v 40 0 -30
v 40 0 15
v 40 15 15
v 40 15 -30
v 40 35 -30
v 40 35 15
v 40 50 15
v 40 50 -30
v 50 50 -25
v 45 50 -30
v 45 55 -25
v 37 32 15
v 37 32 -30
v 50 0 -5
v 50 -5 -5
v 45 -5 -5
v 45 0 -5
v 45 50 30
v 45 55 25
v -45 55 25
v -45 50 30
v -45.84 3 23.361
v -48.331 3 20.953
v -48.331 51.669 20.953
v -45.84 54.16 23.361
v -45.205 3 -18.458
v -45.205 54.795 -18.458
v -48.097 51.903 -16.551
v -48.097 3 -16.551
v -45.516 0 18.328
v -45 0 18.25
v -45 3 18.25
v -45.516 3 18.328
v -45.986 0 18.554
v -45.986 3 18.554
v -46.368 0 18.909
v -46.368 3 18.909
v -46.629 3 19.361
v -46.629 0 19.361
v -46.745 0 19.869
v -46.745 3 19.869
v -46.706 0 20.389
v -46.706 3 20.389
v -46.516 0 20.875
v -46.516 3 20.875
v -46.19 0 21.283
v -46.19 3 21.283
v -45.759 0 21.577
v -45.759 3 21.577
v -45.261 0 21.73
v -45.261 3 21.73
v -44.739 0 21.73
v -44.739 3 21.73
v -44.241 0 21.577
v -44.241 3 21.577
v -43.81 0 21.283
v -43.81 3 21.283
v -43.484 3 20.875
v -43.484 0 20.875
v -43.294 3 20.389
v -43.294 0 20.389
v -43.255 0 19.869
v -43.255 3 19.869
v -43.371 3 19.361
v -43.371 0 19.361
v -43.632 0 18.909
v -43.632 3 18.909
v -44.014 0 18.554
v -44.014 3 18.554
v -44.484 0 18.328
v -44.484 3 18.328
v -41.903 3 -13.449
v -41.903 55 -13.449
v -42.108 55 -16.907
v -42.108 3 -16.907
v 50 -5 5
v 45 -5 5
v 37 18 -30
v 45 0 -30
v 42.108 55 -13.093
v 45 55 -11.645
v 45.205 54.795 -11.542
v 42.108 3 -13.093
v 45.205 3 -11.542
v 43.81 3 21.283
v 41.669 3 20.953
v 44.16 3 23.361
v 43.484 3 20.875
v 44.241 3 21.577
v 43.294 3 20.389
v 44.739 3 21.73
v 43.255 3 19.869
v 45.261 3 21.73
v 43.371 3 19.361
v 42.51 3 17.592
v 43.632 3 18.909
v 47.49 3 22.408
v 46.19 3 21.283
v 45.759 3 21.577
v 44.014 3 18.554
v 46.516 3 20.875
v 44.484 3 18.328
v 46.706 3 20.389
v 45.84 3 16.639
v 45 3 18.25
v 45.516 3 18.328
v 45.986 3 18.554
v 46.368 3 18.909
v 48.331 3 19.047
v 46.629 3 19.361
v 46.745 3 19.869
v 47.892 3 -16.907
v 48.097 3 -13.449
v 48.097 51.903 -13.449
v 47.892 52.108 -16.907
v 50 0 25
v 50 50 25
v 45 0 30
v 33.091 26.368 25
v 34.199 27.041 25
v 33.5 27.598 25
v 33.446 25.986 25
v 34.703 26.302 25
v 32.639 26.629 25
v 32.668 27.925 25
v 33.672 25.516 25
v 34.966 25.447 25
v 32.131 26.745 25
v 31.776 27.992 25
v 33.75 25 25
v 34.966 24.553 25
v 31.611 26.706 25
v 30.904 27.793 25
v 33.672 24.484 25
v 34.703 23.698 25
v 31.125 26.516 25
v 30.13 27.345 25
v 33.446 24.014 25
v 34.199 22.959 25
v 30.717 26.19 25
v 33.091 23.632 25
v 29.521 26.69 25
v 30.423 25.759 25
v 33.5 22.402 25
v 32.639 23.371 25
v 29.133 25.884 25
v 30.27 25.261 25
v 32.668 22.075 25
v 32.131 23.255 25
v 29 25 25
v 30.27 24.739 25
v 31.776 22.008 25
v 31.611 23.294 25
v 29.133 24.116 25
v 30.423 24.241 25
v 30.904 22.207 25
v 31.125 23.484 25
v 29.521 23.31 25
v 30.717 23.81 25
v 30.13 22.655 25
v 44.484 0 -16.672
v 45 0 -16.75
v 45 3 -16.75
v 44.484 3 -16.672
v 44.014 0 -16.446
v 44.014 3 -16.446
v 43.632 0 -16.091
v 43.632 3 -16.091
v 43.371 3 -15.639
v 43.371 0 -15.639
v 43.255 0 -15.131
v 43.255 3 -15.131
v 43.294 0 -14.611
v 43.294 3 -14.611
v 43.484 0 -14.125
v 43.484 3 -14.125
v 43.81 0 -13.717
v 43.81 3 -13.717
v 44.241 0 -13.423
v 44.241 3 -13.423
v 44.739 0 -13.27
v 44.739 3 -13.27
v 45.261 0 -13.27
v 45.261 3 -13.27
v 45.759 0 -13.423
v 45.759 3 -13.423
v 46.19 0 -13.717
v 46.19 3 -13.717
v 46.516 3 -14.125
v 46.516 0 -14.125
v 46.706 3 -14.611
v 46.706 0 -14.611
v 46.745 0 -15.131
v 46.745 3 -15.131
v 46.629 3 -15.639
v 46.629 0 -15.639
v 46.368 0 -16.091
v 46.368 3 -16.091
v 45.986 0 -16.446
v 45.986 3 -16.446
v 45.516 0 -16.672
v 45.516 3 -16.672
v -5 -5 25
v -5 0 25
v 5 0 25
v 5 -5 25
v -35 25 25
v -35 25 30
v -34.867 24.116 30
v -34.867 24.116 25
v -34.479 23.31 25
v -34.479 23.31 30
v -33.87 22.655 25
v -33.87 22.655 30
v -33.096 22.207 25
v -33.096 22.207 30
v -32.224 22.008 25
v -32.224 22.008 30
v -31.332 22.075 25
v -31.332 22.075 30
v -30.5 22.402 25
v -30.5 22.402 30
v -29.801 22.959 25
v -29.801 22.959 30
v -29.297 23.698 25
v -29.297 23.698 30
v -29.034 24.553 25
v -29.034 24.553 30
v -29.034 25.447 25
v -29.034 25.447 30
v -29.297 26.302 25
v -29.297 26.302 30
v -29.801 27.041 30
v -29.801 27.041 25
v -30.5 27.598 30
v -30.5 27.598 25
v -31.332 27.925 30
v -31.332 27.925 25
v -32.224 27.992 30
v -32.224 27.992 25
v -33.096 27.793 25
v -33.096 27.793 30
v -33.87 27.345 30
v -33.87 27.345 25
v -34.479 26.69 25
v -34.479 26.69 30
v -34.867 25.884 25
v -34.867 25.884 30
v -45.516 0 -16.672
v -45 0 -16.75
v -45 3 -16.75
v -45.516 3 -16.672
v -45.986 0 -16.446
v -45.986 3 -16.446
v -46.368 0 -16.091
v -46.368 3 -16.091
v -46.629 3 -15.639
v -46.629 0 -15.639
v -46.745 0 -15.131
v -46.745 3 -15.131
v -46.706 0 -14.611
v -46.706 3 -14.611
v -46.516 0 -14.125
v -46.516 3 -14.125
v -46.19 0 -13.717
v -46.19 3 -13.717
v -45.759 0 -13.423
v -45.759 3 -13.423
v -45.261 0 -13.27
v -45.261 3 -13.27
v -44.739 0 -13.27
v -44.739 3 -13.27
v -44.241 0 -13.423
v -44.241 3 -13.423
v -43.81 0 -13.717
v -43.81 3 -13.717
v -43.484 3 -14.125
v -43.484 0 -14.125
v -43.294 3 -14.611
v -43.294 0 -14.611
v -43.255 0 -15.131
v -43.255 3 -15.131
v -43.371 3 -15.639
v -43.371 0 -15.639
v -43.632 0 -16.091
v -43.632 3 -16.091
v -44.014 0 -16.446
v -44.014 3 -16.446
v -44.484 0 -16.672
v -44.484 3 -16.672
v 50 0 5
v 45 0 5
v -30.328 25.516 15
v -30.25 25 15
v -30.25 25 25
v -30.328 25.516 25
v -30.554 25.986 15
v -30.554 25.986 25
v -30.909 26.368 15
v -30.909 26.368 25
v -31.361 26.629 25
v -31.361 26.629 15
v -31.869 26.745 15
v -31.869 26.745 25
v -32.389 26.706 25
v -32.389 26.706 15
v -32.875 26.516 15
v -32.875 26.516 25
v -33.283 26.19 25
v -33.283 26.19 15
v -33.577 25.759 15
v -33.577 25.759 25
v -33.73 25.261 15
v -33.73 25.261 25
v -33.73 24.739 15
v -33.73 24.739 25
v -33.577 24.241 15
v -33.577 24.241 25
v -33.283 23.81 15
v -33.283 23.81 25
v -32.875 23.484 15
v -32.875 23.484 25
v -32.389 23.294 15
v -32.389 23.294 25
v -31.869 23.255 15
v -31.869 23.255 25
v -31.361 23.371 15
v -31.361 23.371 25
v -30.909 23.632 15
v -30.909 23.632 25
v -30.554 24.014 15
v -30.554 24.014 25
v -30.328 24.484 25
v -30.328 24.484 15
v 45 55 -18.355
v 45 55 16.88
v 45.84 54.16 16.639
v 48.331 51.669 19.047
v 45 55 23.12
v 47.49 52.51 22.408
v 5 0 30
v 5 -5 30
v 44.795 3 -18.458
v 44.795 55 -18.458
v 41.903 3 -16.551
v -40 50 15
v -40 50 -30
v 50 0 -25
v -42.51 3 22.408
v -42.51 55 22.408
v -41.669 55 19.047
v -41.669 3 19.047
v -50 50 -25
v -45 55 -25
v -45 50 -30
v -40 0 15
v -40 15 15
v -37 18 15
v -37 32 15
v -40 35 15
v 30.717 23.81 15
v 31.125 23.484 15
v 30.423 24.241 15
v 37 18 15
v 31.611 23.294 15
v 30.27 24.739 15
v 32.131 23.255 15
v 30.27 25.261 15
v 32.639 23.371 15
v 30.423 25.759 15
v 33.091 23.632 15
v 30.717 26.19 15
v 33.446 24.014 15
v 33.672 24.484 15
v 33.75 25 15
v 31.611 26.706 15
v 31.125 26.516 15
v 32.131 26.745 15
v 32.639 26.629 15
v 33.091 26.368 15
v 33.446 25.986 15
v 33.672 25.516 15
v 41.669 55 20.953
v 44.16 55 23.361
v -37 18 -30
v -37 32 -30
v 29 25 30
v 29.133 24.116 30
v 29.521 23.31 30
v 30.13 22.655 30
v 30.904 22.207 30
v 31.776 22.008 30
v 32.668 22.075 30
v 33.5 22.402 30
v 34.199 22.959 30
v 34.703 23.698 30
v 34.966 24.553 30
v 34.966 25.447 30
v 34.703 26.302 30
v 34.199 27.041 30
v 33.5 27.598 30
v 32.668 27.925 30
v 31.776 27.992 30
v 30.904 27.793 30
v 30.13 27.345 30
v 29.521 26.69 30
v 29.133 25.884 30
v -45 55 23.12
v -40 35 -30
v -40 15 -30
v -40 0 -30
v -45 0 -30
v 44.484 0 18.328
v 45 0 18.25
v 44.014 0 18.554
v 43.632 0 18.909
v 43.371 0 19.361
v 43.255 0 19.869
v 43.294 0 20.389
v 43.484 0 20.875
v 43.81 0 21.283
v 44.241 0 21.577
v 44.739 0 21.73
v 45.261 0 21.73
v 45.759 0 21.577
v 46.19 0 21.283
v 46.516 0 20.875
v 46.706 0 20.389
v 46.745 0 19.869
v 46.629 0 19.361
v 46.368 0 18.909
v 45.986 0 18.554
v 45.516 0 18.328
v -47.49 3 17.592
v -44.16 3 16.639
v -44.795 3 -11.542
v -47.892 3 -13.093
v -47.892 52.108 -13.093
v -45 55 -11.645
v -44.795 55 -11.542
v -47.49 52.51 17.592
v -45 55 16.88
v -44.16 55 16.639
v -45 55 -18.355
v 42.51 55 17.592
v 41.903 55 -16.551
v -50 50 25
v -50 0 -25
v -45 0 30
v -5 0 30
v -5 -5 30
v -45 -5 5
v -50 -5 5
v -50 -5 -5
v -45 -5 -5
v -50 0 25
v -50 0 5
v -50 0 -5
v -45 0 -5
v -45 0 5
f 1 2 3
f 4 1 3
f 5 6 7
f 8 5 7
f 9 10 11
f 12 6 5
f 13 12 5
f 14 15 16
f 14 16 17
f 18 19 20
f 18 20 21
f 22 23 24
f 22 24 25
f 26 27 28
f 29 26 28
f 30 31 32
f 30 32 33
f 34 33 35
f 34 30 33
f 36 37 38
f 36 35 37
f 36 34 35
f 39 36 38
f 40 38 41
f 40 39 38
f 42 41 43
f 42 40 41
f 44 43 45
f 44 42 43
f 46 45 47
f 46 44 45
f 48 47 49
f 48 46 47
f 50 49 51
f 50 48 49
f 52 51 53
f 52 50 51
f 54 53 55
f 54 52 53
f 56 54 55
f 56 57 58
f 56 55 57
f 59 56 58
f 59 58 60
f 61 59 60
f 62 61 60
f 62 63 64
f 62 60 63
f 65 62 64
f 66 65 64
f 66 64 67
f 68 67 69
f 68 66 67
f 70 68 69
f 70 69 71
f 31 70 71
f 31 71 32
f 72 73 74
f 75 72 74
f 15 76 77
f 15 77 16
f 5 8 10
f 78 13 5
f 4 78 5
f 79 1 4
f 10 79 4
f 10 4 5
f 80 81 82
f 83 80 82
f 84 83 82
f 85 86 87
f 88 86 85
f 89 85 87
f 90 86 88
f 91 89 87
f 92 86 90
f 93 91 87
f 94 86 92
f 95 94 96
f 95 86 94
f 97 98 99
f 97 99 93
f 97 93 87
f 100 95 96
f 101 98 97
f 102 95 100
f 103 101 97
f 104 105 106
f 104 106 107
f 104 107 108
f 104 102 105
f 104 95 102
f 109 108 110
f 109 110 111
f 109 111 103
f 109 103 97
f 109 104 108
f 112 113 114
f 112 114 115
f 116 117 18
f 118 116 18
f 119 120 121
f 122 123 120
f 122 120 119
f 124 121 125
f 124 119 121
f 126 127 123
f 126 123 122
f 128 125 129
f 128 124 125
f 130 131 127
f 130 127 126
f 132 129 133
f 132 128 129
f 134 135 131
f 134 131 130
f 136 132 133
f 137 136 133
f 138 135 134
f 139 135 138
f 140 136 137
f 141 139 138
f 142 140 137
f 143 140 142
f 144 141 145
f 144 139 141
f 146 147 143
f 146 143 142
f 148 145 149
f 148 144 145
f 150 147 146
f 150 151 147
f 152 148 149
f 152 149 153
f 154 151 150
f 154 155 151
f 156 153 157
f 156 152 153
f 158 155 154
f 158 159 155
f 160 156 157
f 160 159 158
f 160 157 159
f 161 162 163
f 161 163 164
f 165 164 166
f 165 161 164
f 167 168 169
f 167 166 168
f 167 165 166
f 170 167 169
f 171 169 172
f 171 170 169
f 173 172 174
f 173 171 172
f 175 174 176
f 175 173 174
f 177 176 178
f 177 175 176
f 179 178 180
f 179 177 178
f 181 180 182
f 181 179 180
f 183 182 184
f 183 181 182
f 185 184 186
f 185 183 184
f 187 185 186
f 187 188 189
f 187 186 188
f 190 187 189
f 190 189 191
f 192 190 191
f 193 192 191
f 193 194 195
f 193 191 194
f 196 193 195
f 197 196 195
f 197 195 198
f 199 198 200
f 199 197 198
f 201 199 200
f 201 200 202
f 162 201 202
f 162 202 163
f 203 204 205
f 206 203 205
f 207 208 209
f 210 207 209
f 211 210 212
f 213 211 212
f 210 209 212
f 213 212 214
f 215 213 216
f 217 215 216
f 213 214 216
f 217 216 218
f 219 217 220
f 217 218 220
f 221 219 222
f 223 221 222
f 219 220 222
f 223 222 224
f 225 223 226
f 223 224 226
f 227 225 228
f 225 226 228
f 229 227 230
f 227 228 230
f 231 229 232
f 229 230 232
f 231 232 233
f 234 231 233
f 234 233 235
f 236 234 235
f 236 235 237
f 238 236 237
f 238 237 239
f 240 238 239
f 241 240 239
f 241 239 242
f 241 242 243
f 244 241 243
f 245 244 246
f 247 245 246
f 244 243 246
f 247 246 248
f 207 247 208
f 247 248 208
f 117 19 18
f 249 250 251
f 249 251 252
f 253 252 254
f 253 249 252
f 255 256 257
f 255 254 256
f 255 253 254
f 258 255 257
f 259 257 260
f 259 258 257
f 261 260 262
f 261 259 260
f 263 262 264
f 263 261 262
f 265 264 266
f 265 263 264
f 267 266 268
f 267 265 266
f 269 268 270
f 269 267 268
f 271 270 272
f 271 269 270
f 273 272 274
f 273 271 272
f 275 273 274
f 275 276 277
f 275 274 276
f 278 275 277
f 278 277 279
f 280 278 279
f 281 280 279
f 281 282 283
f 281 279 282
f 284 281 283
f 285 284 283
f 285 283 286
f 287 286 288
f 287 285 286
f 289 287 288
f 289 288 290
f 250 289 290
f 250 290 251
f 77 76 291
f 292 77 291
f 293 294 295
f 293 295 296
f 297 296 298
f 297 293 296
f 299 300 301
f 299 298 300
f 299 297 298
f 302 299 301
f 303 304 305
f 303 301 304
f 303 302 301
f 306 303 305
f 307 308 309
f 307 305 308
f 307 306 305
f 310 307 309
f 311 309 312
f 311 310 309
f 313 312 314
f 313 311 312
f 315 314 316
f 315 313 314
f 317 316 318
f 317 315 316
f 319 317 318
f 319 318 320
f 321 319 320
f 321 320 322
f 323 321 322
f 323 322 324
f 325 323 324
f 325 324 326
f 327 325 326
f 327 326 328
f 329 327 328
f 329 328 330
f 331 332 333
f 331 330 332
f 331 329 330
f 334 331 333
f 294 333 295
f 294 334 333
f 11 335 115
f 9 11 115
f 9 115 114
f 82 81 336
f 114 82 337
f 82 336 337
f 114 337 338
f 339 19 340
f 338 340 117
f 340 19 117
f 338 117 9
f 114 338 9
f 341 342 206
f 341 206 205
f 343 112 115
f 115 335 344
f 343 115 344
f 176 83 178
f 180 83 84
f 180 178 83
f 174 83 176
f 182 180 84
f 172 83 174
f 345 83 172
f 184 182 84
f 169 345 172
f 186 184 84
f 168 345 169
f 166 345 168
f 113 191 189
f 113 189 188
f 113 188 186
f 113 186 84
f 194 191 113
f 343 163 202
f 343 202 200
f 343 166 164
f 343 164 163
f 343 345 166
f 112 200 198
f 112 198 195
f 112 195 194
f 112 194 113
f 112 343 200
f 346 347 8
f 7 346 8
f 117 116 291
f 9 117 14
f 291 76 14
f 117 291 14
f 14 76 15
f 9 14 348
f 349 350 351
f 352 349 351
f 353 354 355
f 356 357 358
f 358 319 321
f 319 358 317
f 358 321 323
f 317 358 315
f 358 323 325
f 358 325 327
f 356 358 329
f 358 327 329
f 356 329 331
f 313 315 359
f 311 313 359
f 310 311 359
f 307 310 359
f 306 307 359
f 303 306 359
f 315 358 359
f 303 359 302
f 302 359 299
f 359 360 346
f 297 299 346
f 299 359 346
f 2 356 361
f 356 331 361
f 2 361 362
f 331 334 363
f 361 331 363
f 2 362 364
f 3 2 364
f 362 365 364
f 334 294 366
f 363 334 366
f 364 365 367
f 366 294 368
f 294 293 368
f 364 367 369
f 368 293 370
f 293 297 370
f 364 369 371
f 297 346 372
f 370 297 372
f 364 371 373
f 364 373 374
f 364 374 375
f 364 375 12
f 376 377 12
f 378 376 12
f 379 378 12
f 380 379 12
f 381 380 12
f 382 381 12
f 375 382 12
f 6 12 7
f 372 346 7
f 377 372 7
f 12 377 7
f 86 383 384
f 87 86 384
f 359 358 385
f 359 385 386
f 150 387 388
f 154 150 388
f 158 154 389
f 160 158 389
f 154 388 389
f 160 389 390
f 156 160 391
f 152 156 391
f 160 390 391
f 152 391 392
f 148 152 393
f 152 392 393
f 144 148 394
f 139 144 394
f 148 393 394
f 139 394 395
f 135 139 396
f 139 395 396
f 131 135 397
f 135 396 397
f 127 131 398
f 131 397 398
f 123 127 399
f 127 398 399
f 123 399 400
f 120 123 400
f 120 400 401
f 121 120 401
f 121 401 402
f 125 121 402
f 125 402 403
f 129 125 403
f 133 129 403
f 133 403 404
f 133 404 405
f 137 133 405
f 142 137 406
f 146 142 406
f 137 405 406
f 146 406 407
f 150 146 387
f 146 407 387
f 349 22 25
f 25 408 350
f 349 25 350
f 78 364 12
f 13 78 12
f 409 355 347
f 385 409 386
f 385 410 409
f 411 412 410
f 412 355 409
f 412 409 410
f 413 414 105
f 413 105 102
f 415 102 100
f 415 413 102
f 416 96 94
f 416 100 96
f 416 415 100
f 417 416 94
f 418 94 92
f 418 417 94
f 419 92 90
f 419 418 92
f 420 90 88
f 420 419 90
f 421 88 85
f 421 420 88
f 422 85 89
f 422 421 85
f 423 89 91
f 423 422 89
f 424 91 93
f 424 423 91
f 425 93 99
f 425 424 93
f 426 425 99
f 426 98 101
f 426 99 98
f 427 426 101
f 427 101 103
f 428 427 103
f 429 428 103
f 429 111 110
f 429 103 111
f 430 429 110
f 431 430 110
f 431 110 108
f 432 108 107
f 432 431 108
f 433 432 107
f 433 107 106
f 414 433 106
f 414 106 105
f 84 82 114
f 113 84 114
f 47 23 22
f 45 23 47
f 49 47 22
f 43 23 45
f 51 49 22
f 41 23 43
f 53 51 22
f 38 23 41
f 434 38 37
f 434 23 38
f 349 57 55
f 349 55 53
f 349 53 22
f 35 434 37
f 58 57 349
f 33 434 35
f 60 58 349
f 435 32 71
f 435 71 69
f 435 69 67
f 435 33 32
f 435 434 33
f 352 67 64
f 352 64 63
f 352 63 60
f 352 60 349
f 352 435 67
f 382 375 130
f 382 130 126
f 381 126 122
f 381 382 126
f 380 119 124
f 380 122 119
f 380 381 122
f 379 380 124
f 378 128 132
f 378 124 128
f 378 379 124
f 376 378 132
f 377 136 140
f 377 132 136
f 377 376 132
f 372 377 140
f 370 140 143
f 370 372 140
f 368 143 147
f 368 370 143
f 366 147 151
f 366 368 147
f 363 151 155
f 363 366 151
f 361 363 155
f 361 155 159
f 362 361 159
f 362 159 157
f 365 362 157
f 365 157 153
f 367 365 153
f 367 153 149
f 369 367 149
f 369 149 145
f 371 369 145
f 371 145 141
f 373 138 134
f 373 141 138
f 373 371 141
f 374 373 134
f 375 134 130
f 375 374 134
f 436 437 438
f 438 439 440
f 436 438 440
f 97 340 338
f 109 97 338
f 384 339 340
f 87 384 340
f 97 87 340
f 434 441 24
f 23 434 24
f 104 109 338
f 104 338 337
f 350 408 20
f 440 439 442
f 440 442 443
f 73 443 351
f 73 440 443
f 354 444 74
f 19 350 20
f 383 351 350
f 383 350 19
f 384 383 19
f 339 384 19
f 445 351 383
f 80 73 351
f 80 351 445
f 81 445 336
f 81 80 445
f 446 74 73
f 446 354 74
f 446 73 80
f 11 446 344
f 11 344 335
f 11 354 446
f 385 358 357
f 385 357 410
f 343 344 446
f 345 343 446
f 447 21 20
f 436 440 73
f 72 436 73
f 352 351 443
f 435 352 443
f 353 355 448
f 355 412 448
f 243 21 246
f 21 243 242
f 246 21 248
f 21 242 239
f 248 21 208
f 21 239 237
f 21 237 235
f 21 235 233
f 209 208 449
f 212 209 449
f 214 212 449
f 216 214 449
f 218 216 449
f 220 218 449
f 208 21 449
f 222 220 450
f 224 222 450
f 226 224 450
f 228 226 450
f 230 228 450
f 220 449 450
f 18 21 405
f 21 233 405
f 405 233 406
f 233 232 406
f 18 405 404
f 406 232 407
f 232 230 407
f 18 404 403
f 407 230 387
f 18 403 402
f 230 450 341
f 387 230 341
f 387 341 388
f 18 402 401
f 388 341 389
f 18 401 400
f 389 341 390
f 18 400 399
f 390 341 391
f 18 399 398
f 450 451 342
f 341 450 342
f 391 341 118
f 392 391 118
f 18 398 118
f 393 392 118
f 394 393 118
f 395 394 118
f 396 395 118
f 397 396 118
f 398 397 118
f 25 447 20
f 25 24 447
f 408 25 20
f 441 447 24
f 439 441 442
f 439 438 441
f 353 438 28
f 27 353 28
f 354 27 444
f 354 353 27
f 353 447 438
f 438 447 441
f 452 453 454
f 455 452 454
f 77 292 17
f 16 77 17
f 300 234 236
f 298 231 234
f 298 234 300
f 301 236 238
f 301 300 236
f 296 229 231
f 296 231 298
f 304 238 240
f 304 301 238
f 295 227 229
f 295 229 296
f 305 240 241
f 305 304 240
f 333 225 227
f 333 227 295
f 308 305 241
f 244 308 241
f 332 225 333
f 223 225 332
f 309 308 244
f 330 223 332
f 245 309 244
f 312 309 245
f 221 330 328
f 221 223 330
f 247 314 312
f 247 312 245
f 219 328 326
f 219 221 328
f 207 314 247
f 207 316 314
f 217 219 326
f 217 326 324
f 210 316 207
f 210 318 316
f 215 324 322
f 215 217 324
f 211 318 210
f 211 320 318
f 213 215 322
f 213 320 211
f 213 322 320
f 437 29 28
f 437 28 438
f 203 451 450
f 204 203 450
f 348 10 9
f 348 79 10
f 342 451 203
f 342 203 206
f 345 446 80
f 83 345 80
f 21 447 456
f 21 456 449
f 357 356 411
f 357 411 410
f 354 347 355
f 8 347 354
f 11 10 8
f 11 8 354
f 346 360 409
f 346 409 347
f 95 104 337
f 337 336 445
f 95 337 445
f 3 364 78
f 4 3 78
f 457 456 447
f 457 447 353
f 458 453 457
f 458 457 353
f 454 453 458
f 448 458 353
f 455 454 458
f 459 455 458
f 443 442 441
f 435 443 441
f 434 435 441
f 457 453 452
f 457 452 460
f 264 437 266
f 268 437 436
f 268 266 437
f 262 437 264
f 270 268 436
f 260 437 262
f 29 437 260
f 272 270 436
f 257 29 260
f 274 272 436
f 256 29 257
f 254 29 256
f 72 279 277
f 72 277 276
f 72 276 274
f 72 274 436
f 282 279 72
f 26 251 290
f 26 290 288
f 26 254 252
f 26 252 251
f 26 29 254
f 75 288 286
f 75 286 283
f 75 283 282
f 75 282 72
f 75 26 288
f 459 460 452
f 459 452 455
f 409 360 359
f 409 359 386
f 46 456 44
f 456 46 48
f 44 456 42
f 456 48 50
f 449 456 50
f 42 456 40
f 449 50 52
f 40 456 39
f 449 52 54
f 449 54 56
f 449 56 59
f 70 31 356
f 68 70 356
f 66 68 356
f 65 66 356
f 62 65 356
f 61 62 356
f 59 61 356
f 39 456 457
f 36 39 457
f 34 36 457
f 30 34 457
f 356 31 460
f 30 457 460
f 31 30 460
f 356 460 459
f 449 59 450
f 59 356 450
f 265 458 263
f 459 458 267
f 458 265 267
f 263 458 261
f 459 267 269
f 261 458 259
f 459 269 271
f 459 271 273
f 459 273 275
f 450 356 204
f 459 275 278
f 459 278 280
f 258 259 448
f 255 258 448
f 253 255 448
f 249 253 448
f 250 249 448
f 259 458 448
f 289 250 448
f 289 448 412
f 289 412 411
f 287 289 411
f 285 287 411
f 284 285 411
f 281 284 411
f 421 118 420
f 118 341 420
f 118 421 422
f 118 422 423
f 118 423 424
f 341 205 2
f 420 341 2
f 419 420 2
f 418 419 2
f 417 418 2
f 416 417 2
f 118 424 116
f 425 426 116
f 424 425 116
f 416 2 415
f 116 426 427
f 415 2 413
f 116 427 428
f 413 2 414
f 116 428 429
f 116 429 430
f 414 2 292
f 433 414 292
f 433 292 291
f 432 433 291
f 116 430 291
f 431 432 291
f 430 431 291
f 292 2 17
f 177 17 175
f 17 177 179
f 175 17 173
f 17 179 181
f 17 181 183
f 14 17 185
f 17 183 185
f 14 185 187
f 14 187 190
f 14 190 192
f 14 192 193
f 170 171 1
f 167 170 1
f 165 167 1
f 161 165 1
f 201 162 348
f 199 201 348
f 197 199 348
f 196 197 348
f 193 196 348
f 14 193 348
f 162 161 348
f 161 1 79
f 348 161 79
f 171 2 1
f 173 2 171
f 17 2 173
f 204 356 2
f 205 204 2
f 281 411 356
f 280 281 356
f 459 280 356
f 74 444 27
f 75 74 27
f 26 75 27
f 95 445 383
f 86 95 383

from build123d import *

# Parameters (mm, degrees)
SKETCH1_W               = 100
SKETCH1_H               = 60
BOSS_EXTRUDE1_DEPTH     = 55
CUT_EXTRUDE1_START      = -30
SKETCH2_W               = 80
SKETCH2_H               = 100
CUT_EXTRUDE1_DEPTH      = 45
CUT_EXTRUDE2_DEPTH      = 81.156097709
CUT_EXTRUDE2_DEPTH_BACK = 81.156097709
SKETCH3_R               = 1.75
CUT_EXTRUDE3_START      = 55
CUT_EXTRUDE3_DEPTH      = 52
BOSS_EXTRUDE2_START     = 15
SKETCH5_W               = 3
SKETCH5_H               = 20
BOSS_EXTRUDE2_DEPTH     = 45
CHAMFER1_SIZE           = 3
CUT_EXTRUDE4_DEPTH      = 81.156097709
CUT_EXTRUDE4_DEPTH_BACK = 81.156097709
SKETCH6_R               = 1.75
CUT_EXTRUDE5_START      = 30
SKETCH7_R               = 3
CUT_EXTRUDE5_DEPTH      = 5
BOSS_EXTRUDE3_START     = 50
SKETCH8_W               = 10
SKETCH8_H               = 5
BOSS_EXTRUDE3_DEPTH     = 5
BOSS_EXTRUDE4_START     = -50
SKETCH8_2_W             = 10
SKETCH8_2_H             = 5
BOSS_EXTRUDE4_DEPTH     = 5
BOSS_EXTRUDE5_START     = 30
SKETCH9_W               = 10
SKETCH9_H               = 5
BOSS_EXTRUDE5_DEPTH     = 5


# Some blends are built 0.0001 mm under size
with BuildPart() as part:
    # Sketch1 → Boss-Extrude1 (new body)
    with BuildSketch(Plane(origin=(0, 0, 0), x_dir=(1, 0, 0), z_dir=(0, 1, 0))):
        Rectangle(SKETCH1_W, SKETCH1_H)
    extrude(amount=BOSS_EXTRUDE1_DEPTH)

    # Sketch2 → Cut-Extrude1 (cut)
    with BuildSketch(Plane.XY.offset(CUT_EXTRUDE1_START)):
        Rectangle(SKETCH2_W, SKETCH2_H)
    extrude(amount=CUT_EXTRUDE1_DEPTH, mode=Mode.SUBTRACT)

    # Sketch3 → Cut-Extrude2 (cut, two sides: drawn at the far end of the back side and taken through both)
    with BuildSketch(Plane(origin=(0, 0, 0), x_dir=(1, 0, 0), z_dir=(0, 1, 0)).offset(-CUT_EXTRUDE2_DEPTH_BACK)):
        with Locations(Location((-45, 15, 0), (0, 0, 90))):
            Circle(SKETCH3_R)
        with Locations(Location((45, 15, 0), (0, 0, 90))):
            Circle(SKETCH3_R)
        with Locations(Location((45, -20, 0), (0, 0, 90))):
            Circle(SKETCH3_R)
        with Locations(Location((-45, -20, 0), (0, 0, 90))):
            Circle(SKETCH3_R)
    extrude(amount=CUT_EXTRUDE2_DEPTH + CUT_EXTRUDE2_DEPTH_BACK, mode=Mode.SUBTRACT)

    # Sketch4 → Cut-Extrude3 (cut)
    with BuildSketch(Plane(origin=(0, 0, 0), x_dir=(1, 0, 0), z_dir=(0, 1, 0)).offset(CUT_EXTRUDE3_START)):
        Polygon((44.159672203, -23.360632261), (47.490229012, -22.408061351), (48.330556809, -19.04742909), (45.840327797, -16.639367739), (42.509770988, -17.591938649), (41.669443191, -20.95257091), align=None)
        Polygon((44.794589767, 18.458006165), (41.902573698, 16.551112602), (42.107983932, 13.093106437), (45.205410233, 11.541993835), (48.097426302, 13.448887398), (47.892016068, 16.906893563), align=None)
        Polygon((-45.840327797, -23.360632261), (-42.509770988, -22.408061351), (-41.669443191, -19.04742909), (-44.159672203, -16.639367739), (-47.490229012, -17.591938649), (-48.330556809, -20.95257091), align=None)
        Polygon((-45.205410233, 18.458006165), (-48.097426302, 16.551112602), (-47.892016068, 13.093106437), (-44.794589767, 11.541993835), (-41.902573698, 13.448887398), (-42.107983932, 16.906893563), align=None)
    extrude(amount=-CUT_EXTRUDE3_DEPTH, mode=Mode.SUBTRACT)

    # Sketch5 → Boss-Extrude2 (add)
    with BuildSketch(Plane.XY.offset(BOSS_EXTRUDE2_START)):
        with Locations((-38.5, 25)):
            Rectangle(SKETCH5_W, SKETCH5_H)
        with Locations((38.5, 25)):
            Rectangle(SKETCH5_W, SKETCH5_H)
    extrude(amount=-BOSS_EXTRUDE2_DEPTH)

    # Chamfer1
    chamfer1_edges = [part.edges().sort_by_distance(p)[0] for p in [
        (37, 15, -7.5),
        (37, 35, -7.5),
        (-37, 15, -7.5),
        (-37, 35, -7.5),
    ]]
    chamfer(chamfer1_edges, length=CHAMFER1_SIZE - 0.0001)  # a hair under: the kernel refuses the full size

    # Sketch6 → Cut-Extrude4 (cut, two sides: drawn at the far end of the back side and taken through both)
    with BuildSketch(Plane.XY.offset(-CUT_EXTRUDE4_DEPTH_BACK)):
        with Locations((32, 25)):
            Circle(SKETCH6_R)
        with Locations((-32, 25)):
            Circle(SKETCH6_R)
    extrude(amount=CUT_EXTRUDE4_DEPTH + CUT_EXTRUDE4_DEPTH_BACK, mode=Mode.SUBTRACT)

    # Sketch7 → Cut-Extrude5 (cut)
    with BuildSketch(Plane.XY.offset(CUT_EXTRUDE5_START)):
        with Locations(Location((-32, 25, 0), (0, 0, 180))):
            Circle(SKETCH7_R)
        with Locations(Location((32, 25, 0), (0, 0, 180))):
            Circle(SKETCH7_R)
    extrude(amount=-CUT_EXTRUDE5_DEPTH, mode=Mode.SUBTRACT)

    # Sketch8 → Boss-Extrude3 (add)
    with BuildSketch(Plane(origin=(0, 0, 0), x_dir=(0, 0, -1), z_dir=(1, 0, 0)).offset(BOSS_EXTRUDE3_START)):
        with Locations((0, -2.5)):
            Rectangle(SKETCH8_W, SKETCH8_H)
    extrude(amount=-BOSS_EXTRUDE3_DEPTH)

    # Sketch8<2> → Boss-Extrude4 (add)
    with BuildSketch(Plane(origin=(0, 0, 0), x_dir=(0, 0, -1), z_dir=(1, 0, 0)).offset(BOSS_EXTRUDE4_START)):
        with Locations((0, -2.5)):
            Rectangle(SKETCH8_2_W, SKETCH8_2_H)
    extrude(amount=BOSS_EXTRUDE4_DEPTH)

    # Sketch9 → Boss-Extrude5 (add)
    with BuildSketch(Plane.XY.offset(BOSS_EXTRUDE5_START)):
        with Locations((0, -2.5)):
            Rectangle(SKETCH9_W, SKETCH9_H)
    extrude(amount=-BOSS_EXTRUDE5_DEPTH)

    # Chamfer2
    # the kernel refuses this chamfer: 5 mm, written as the material it takes off along each edge
    with BuildSketch(Plane(origin=(-46.666666667, 51.666666667, -26.666666667), x_dir=(0, 0.7071067811865475, 0.7071067811865475), z_dir=(-0.5773502691896257, 0.5773502691896257, -0.5773502691896257)), Plane(origin=(46.666666667, 51.666666667, 26.666666667), x_dir=(0, 0.7071067811865475, -0.7071067811865475), z_dir=(0.5773502691896257, 0.5773502691896257, 0.5773502691896257))) as chamfer2_piece_1:
        Polygon((-3.535533906, 2.041241452), (3.535533906, 2.041241452), (0, -4.082482905), align=None)
    extrude(amount=6.350852961, mode=Mode.SUBTRACT)
    with BuildSketch(Plane(origin=(46.666666667, 51.666666667, -26.666666667), x_dir=(0, 0.7071067811865475, 0.7071067811865475), z_dir=(0.577350269189626, 0.5773502691896256, -0.5773502691896256)), Plane(origin=(-46.666666667, 51.666666667, 26.666666667), x_dir=(0, 0.7071067811865475, -0.7071067811865475), z_dir=(-0.577350269189626, 0.5773502691896256, 0.5773502691896256))) as chamfer2_piece_2:
        Polygon((-3.535533906, -2.041241452), (3.535533906, -2.041241452), (0, 4.082482905), align=None)
    extrude(amount=6.350852961, mode=Mode.SUBTRACT)
    with BuildSketch(Plane(origin=(-50, -12.85841494, -30), x_dir=(0.9996219169112968, 0, -0.027495876610586317), z_dir=(0, 1, 0)), Plane(origin=(-50, -12.85841494, 30), x_dir=(-0.027495876610586317, 0, -0.9996219169112968), z_dir=(0, 1, 0))) as chamfer2_piece_3:
        with BuildLine():
            Line((5.143365976, 0), (-0.282735774, -5.135588968))
            Line((-0.282735774, -5.135588968), (-0.382697966, -5.13283938))
            ThreePointArc((-0.382697966, -5.13283938), (-0.170646135, -2.566989148), (-0.099962192, 0.002749588))
            Line((-0.099962192, 0.002749588), (0.002749588, 0.099962192))
            ThreePointArc((0.002749588, 0.099962192), (2.572488324, 0.029278248), (5.146115564, 0.099962192))
            Line((5.146115564, 0.099962192), (5.143365976, 0))
        make_face()
    extrude(amount=80.71682988, mode=Mode.SUBTRACT)
    with BuildSketch(Plane(origin=(50, -12.85841494, -30), x_dir=(-0.9996219169112968, 0, -0.027495876610586317), z_dir=(0, 1, 0)), Plane(origin=(50, -12.85841494, 30), x_dir=(0.027495876610586317, 0, -0.9996219169112968), z_dir=(0, 1, 0))) as chamfer2_piece_4:
        with BuildLine():
            Line((5.143365976, 0), (-0.282735774, 5.135588968))
            Line((-0.282735774, 5.135588968), (-0.382697966, 5.13283938))
            ThreePointArc((-0.382697966, 5.13283938), (-0.170646135, 2.566989148), (-0.099962192, -0.002749588))
            Line((-0.099962192, -0.002749588), (0.002749588, -0.099962192))
            ThreePointArc((0.002749588, -0.099962192), (2.572488324, -0.029278248), (5.146115564, -0.099962192))
            Line((5.146115564, -0.099962192), (5.143365976, 0))
        make_face()
    extrude(amount=80.71682988, mode=Mode.SUBTRACT)
    with BuildSketch(Plane(origin=(50, 55, 42.85841494), x_dir=(-0.9996219169112968, 0.027495876610586317, 0), z_dir=(0, 0, -1))) as chamfer2_piece_5:
        with BuildLine():
            Line((5.143365976, 0), (-0.282735774, -5.135588968))
            Line((-0.282735774, -5.135588968), (-0.382697966, -5.13283938))
            ThreePointArc((-0.382697966, -5.13283938), (-0.170646135, -2.566989148), (-0.099962192, 0.002749588))
            Line((-0.099962192, 0.002749588), (0.002749588, 0.099962192))
            ThreePointArc((0.002749588, 0.099962192), (2.572488324, 0.029278248), (5.146115564, 0.099962192))
            Line((5.146115564, 0.099962192), (5.143365976, 0))
        make_face()
    extrude(amount=85.71682988, mode=Mode.SUBTRACT)
    with BuildSketch(Plane(origin=(-50, 55, -42.85841494), x_dir=(-0.027495876610586317, -0.9996219169112968, 0), z_dir=(0, 0, 1))) as chamfer2_piece_6:
        with BuildLine():
            Line((5.143365976, 0), (-0.282735774, 5.135588968))
            Line((-0.282735774, 5.135588968), (-0.382697966, 5.13283938))
            ThreePointArc((-0.382697966, 5.13283938), (-0.170646135, 2.566989148), (-0.099962192, -0.002749588))
            Line((-0.099962192, -0.002749588), (0.002749588, -0.099962192))
            ThreePointArc((0.002749588, -0.099962192), (2.572488324, -0.029278248), (5.146115564, -0.099962192))
            Line((5.146115564, -0.099962192), (5.143365976, 0))
        make_face()
    extrude(amount=85.71682988, mode=Mode.SUBTRACT)
    with BuildSketch(Plane(origin=(-62.85841494, 55, 30), x_dir=(0, 0.027495876610586317, -0.9996219169112968), z_dir=(1, 0, 0))) as chamfer2_piece_7:
        with BuildLine():
            Line((5.143365976, 0), (-0.282735774, -5.135588968))
            Line((-0.282735774, -5.135588968), (-0.382697966, -5.13283938))
            ThreePointArc((-0.382697966, -5.13283938), (-0.170646135, -2.566989148), (-0.099962192, 0.002749588))
            Line((-0.099962192, 0.002749588), (0.002749588, 0.099962192))
            ThreePointArc((0.002749588, 0.099962192), (2.572488324, 0.029278248), (5.146115564, 0.099962192))
            Line((5.146115564, 0.099962192), (5.143365976, 0))
        make_face()
    extrude(amount=125.71682988, mode=Mode.SUBTRACT)
    with BuildSketch(Plane(origin=(62.85841494, 55, -30), x_dir=(0, -0.9996219169112968, -0.027495876610586317), z_dir=(-1, 0, 0))) as chamfer2_piece_8:
        with BuildLine():
            Line((5.143365976, 0), (-0.282735774, 5.135588968))
            Line((-0.282735774, 5.135588968), (-0.382697966, 5.13283938))
            ThreePointArc((-0.382697966, 5.13283938), (-0.170646135, 2.566989148), (-0.099962192, -0.002749588))
            Line((-0.099962192, -0.002749588), (0.002749588, -0.099962192))
            ThreePointArc((0.002749588, -0.099962192), (2.572488324, -0.029278248), (5.146115564, -0.099962192))
            Line((5.146115564, -0.099962192), (5.143365976, 0))
        make_face()
    extrude(amount=125.71682988, mode=Mode.SUBTRACT)


solid = part.part
